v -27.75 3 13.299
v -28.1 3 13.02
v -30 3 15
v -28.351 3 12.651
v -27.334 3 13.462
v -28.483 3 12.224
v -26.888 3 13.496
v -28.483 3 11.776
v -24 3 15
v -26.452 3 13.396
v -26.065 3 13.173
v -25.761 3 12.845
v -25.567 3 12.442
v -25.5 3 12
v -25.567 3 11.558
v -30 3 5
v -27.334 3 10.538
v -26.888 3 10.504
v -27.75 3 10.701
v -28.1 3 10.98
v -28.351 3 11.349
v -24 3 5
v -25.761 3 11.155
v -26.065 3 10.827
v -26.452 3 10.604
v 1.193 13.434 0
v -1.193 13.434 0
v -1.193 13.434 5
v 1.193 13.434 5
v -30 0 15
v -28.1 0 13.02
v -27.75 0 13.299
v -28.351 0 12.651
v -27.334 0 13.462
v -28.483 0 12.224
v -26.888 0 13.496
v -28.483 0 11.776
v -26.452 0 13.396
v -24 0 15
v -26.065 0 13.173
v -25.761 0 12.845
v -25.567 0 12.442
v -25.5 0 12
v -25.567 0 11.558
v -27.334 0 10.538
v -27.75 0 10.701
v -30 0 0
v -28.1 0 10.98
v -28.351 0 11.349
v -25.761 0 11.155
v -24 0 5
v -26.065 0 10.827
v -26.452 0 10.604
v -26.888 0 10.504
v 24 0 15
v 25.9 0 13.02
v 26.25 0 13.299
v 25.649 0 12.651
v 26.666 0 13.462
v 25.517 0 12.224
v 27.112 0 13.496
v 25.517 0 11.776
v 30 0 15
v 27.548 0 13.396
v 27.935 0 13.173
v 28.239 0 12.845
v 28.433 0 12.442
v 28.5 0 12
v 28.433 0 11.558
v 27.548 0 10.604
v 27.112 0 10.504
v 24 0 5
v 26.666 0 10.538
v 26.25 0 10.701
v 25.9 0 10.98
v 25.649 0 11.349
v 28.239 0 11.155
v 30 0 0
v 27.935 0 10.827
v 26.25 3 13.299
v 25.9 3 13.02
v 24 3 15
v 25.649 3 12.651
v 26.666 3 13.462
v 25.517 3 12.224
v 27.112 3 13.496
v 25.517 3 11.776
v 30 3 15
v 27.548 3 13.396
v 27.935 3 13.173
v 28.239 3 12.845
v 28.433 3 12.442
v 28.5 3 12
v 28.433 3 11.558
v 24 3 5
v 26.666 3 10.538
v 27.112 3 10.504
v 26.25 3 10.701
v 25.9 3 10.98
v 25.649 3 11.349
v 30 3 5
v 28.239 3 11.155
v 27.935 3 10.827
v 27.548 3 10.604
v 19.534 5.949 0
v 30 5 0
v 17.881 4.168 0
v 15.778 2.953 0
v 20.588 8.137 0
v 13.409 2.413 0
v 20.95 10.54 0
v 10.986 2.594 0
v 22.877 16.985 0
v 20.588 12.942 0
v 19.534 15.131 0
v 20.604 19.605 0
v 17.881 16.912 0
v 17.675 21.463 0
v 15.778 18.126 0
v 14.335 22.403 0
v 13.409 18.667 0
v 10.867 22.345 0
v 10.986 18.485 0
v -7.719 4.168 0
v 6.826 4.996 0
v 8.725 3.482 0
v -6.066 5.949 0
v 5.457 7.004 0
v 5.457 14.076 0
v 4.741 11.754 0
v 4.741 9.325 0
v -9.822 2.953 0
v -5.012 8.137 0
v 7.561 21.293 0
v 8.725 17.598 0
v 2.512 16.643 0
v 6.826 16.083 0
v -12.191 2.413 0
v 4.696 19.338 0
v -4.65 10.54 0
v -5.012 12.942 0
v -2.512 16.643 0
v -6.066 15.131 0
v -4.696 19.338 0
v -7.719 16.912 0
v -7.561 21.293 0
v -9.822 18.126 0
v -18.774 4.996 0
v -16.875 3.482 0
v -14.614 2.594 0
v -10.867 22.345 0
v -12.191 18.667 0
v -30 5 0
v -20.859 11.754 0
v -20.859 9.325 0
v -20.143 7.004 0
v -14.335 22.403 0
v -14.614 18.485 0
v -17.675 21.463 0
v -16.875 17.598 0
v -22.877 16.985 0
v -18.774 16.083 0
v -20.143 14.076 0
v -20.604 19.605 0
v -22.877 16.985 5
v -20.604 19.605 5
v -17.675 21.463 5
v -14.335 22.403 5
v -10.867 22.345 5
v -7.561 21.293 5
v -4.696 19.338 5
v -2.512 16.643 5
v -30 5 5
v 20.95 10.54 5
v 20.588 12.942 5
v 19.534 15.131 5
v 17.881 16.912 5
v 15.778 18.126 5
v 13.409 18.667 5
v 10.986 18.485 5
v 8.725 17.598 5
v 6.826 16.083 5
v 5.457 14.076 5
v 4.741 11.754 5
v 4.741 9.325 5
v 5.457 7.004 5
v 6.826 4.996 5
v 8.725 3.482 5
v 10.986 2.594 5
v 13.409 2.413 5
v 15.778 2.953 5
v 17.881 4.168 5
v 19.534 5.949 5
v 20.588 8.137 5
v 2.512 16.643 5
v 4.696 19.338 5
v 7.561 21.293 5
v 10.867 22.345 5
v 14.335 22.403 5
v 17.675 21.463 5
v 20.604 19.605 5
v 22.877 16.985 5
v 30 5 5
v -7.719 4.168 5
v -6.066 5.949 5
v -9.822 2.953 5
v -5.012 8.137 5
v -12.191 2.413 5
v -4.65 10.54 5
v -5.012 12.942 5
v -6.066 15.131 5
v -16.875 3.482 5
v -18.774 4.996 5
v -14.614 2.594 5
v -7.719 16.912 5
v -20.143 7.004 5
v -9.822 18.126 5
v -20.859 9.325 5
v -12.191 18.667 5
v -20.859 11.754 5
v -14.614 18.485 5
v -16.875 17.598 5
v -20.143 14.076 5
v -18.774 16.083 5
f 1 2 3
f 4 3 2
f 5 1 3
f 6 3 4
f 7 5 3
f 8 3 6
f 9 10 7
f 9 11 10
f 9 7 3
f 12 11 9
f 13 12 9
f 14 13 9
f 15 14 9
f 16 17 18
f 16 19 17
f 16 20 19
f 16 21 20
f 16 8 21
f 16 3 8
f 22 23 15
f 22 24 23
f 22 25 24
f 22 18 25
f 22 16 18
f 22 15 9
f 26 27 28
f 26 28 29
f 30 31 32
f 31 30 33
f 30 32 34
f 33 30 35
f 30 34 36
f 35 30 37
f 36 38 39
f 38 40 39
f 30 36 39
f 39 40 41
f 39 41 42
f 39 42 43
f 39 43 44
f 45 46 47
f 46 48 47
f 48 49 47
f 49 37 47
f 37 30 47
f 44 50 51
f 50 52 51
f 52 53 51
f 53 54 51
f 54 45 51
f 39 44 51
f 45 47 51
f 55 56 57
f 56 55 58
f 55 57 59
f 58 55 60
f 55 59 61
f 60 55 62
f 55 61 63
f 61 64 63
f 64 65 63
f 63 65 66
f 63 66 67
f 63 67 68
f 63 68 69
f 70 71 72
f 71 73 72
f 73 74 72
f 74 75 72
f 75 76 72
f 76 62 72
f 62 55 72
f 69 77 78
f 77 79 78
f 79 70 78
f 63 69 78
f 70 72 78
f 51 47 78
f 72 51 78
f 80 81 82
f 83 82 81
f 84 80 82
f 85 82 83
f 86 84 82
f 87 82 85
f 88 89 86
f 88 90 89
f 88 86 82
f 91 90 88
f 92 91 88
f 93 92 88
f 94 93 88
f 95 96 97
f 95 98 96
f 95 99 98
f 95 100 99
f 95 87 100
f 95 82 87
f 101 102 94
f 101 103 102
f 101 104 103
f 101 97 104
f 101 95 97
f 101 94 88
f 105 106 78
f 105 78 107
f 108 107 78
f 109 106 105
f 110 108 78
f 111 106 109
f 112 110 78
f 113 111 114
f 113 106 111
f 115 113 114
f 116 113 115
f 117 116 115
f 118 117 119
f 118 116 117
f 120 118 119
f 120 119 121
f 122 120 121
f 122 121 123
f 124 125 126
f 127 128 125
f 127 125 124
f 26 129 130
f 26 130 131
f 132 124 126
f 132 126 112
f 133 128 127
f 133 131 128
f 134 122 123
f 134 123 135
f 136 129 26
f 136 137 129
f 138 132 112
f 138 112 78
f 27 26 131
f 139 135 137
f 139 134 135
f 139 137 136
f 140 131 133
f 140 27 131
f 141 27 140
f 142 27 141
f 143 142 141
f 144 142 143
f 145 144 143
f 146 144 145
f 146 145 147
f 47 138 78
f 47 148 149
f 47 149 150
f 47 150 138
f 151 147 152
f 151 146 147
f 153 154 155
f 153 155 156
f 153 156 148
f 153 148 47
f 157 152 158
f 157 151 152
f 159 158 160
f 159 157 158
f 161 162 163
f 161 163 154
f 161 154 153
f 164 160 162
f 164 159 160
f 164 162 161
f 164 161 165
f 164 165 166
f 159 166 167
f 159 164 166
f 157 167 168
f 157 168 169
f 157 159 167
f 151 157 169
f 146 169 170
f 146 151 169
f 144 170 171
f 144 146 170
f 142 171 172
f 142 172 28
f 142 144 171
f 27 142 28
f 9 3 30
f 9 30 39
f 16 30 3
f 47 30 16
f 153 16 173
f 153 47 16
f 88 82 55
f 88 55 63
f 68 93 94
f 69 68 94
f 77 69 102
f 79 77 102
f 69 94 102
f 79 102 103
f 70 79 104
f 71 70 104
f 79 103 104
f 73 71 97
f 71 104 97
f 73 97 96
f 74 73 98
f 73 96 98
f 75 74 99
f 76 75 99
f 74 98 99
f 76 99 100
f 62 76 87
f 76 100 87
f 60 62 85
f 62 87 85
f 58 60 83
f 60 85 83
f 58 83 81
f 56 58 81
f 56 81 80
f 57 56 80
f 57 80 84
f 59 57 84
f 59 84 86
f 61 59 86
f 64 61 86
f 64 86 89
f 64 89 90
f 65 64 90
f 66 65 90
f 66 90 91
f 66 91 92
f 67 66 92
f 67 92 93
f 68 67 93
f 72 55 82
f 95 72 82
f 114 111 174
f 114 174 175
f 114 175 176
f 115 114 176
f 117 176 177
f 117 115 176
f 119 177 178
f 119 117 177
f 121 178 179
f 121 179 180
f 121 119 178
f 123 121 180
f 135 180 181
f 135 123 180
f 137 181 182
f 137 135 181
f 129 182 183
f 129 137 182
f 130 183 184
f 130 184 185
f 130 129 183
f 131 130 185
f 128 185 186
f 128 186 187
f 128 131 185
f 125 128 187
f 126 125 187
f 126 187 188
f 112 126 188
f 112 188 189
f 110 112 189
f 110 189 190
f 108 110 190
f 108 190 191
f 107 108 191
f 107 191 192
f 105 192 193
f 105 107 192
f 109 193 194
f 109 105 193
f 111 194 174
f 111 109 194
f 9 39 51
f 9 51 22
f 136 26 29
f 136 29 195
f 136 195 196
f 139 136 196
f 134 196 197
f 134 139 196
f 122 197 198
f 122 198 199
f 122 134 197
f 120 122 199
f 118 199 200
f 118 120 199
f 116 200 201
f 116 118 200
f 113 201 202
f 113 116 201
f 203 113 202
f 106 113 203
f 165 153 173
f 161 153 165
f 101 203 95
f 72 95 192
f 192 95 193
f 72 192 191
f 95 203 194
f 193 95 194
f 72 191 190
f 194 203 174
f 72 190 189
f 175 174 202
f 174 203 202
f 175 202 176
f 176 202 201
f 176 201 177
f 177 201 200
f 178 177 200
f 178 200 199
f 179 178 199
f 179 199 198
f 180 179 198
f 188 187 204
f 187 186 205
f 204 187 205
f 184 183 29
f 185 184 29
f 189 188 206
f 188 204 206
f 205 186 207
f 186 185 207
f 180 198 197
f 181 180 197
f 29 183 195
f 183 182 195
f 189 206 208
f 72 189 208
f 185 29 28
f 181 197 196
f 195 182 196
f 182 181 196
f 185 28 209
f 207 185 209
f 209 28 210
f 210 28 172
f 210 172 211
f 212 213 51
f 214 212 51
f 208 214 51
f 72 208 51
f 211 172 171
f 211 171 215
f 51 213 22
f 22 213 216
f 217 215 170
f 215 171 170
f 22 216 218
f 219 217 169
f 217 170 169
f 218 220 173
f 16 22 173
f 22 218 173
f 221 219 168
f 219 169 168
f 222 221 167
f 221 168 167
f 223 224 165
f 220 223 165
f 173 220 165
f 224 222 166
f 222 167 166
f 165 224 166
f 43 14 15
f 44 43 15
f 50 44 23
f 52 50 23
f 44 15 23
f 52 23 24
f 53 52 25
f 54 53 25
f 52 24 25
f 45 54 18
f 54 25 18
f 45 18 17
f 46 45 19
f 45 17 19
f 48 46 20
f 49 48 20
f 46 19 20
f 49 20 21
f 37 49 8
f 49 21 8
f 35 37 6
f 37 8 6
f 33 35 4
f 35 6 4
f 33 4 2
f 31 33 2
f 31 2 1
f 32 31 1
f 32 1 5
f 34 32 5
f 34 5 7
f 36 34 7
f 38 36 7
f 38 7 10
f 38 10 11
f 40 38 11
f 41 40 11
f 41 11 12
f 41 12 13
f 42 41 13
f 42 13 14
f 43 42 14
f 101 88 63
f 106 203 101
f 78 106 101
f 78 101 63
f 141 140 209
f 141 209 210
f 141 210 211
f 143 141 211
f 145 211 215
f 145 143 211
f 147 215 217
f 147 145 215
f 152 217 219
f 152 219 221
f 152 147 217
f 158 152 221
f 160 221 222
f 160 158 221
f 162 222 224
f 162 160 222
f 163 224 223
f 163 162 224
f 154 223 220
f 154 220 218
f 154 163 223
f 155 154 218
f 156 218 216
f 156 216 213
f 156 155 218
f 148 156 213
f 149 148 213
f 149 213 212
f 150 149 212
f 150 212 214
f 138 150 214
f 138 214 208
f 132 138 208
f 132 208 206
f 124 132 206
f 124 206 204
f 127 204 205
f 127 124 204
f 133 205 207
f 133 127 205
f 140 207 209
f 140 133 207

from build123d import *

# Parameters (mm, degrees)
SKETCH1_R           = 8.15
BOSS_EXTRUDE1_DEPTH = 5
SKETCH3_W           = 6
SKETCH3_H           = 3
BOSS_EXTRUDE2_DEPTH = 10
SKETCH4_R           = 1.5
CUT_EXTRUDE1_DEPTH  = 10


with BuildPart() as part:
    # Sketch1 → Boss-Extrude1 (new body)
    with BuildSketch(Plane.XY):
        with BuildLine():
            Line((30, 0), (-30, 0))
            Line((-30, 0), (-30, 5))
            Line((-30, 5), (-22.877190338, 16.984968219))
            ThreePointArc((-22.877190338, 16.984968219), (-10.866798453, 22.344543701), (-1.193346785, 13.433937918))
            Line((-1.193346785, 13.433937918), (1.193346785, 13.433937918))
            ThreePointArc((1.193346785, 13.433937918), (10.866798453, 22.344543701), (22.877190338, 16.984968219))
            Line((22.877190338, 16.984968219), (30, 5))
            Line((30, 5), (30, 0))
        make_face()
        with Locations((-12.8, 10.539733165)):
            Circle(SKETCH1_R, mode=Mode.SUBTRACT)
        with Locations((12.8, 10.539733165)):
            Circle(SKETCH1_R, mode=Mode.SUBTRACT)
    extrude(amount=BOSS_EXTRUDE1_DEPTH)

    # Sketch3 → Boss-Extrude2 (add)
    with BuildSketch(Plane.XY.offset(5)):
        with Locations((-27, 1.5)):
            Rectangle(SKETCH3_W, SKETCH3_H)
        with Locations((27, 1.5)):
            Rectangle(SKETCH3_W, SKETCH3_H)
    extrude(amount=BOSS_EXTRUDE2_DEPTH)

    # Sketch4 → Cut-Extrude1 (cut)
    with BuildSketch(Plane(origin=(0, 3, 0), x_dir=(1, 0, 0), z_dir=(0, 1, 0))):
        with Locations((-27, -12)):
            Circle(SKETCH4_R)
        with Locations((27, -12)):
            Circle(SKETCH4_R)
    extrude(amount=-CUT_EXTRUDE1_DEPTH, mode=Mode.SUBTRACT)


solid = part.part
